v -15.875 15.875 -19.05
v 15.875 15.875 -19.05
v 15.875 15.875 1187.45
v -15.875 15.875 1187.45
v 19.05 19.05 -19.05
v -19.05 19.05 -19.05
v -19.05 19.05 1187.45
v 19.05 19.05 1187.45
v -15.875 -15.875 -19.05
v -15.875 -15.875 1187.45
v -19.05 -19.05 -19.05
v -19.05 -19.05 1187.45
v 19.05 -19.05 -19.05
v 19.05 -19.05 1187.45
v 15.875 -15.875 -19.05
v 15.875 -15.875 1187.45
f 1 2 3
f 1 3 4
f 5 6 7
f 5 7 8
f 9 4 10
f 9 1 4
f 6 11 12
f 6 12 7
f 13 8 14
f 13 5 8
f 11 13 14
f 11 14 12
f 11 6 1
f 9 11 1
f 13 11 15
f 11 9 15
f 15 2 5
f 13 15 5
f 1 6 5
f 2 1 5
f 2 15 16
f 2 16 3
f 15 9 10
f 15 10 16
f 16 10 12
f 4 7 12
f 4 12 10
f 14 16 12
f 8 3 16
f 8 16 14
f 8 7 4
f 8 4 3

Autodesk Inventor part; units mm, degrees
ref_plane "Start Plane" through (0, 0, -19.05) normal (0, 0, 1) x (1, 0, 0)
ref_plane "End Plane" through (0, 0, 1187.45) normal (0, 0, 1) x (1, 0, 0)
sketch "Sketch" plane through (0, 0, 0) normal (0, 0, 1) x (1, 0, 0)
  line L0 (-19.05, 19.05) -> (19.05, 19.05)
  line L1 (19.05, 19.05) -> (19.05, -19.05)
  line L2 (19.05, -19.05) -> (-19.05, -19.05)
  line L3 (-19.05, -19.05) -> (-19.05, 19.05)
  line L4 (15.875, 15.875) -> (-15.875, 15.875)
  line L5 (-15.875, 15.875) -> (-15.875, -15.875)
  line L6 (-15.875, -15.875) -> (15.875, -15.875)
  line L7 (15.875, -15.875) -> (15.875, 15.875)
  point P0 (0, 0)
  point P1 (0, 19.05)
  point P2 (-19.05, 0)
  dimension "width" = 38.1
  dimension "d1" = 3.175
extrude "Body" add sketch "Sketch" along normal up to surface (1206.5 mm away) from surface at -19.05
sketch "Sketch4" plane through (0, 0, 0) normal (0, 0, 1) x (1, 0, 0)
  line L0 (0, 0) -> (10, 0)
ref_plane "Work Plane4" through (0, 0, 0) normal (0, -1, 0) x (1, 0, 0)
sketch "Sketch5" plane through (0, 0, 0) normal (0, -1, 0) x (1, 0, 0)
  line L0 (-2, -19.05) -> (12, -19.05)
  line L1 (-2, 1187.45) -> (12, 1187.45)
  dimension "d9" = 1206.5
ref_plane "Work Plane5" through (685.8, -19.05, -19.05) normal (0, 0, -1) x (-1, 0, 0)
split "Split1" plane through (685.8, -19.05, -19.05) removes the side toward (0, 0, -1)
ref_plane "Work Plane6" through (0, -19.05, 1187.45) normal (0, 0, 1) x (1, 0, 0)
split "Split2" plane through (0, -19.05, 1187.45) removes the side toward (0, 0, 1)
equation "\"G_OFFSET_START\" = 19.05"
equation "\"G_OFFSET_END\" = 19.05"
equation "\"d4\" = -G_OFFSET_START"
equation "\"d5\" = length + G_OFFSET_END"
equation "\"G_L\" = 1168.4"
equation "\"length\" = 1168.4"
properties part number "1.5x1.5x.125 Tube" material "Aluminum-6061"
